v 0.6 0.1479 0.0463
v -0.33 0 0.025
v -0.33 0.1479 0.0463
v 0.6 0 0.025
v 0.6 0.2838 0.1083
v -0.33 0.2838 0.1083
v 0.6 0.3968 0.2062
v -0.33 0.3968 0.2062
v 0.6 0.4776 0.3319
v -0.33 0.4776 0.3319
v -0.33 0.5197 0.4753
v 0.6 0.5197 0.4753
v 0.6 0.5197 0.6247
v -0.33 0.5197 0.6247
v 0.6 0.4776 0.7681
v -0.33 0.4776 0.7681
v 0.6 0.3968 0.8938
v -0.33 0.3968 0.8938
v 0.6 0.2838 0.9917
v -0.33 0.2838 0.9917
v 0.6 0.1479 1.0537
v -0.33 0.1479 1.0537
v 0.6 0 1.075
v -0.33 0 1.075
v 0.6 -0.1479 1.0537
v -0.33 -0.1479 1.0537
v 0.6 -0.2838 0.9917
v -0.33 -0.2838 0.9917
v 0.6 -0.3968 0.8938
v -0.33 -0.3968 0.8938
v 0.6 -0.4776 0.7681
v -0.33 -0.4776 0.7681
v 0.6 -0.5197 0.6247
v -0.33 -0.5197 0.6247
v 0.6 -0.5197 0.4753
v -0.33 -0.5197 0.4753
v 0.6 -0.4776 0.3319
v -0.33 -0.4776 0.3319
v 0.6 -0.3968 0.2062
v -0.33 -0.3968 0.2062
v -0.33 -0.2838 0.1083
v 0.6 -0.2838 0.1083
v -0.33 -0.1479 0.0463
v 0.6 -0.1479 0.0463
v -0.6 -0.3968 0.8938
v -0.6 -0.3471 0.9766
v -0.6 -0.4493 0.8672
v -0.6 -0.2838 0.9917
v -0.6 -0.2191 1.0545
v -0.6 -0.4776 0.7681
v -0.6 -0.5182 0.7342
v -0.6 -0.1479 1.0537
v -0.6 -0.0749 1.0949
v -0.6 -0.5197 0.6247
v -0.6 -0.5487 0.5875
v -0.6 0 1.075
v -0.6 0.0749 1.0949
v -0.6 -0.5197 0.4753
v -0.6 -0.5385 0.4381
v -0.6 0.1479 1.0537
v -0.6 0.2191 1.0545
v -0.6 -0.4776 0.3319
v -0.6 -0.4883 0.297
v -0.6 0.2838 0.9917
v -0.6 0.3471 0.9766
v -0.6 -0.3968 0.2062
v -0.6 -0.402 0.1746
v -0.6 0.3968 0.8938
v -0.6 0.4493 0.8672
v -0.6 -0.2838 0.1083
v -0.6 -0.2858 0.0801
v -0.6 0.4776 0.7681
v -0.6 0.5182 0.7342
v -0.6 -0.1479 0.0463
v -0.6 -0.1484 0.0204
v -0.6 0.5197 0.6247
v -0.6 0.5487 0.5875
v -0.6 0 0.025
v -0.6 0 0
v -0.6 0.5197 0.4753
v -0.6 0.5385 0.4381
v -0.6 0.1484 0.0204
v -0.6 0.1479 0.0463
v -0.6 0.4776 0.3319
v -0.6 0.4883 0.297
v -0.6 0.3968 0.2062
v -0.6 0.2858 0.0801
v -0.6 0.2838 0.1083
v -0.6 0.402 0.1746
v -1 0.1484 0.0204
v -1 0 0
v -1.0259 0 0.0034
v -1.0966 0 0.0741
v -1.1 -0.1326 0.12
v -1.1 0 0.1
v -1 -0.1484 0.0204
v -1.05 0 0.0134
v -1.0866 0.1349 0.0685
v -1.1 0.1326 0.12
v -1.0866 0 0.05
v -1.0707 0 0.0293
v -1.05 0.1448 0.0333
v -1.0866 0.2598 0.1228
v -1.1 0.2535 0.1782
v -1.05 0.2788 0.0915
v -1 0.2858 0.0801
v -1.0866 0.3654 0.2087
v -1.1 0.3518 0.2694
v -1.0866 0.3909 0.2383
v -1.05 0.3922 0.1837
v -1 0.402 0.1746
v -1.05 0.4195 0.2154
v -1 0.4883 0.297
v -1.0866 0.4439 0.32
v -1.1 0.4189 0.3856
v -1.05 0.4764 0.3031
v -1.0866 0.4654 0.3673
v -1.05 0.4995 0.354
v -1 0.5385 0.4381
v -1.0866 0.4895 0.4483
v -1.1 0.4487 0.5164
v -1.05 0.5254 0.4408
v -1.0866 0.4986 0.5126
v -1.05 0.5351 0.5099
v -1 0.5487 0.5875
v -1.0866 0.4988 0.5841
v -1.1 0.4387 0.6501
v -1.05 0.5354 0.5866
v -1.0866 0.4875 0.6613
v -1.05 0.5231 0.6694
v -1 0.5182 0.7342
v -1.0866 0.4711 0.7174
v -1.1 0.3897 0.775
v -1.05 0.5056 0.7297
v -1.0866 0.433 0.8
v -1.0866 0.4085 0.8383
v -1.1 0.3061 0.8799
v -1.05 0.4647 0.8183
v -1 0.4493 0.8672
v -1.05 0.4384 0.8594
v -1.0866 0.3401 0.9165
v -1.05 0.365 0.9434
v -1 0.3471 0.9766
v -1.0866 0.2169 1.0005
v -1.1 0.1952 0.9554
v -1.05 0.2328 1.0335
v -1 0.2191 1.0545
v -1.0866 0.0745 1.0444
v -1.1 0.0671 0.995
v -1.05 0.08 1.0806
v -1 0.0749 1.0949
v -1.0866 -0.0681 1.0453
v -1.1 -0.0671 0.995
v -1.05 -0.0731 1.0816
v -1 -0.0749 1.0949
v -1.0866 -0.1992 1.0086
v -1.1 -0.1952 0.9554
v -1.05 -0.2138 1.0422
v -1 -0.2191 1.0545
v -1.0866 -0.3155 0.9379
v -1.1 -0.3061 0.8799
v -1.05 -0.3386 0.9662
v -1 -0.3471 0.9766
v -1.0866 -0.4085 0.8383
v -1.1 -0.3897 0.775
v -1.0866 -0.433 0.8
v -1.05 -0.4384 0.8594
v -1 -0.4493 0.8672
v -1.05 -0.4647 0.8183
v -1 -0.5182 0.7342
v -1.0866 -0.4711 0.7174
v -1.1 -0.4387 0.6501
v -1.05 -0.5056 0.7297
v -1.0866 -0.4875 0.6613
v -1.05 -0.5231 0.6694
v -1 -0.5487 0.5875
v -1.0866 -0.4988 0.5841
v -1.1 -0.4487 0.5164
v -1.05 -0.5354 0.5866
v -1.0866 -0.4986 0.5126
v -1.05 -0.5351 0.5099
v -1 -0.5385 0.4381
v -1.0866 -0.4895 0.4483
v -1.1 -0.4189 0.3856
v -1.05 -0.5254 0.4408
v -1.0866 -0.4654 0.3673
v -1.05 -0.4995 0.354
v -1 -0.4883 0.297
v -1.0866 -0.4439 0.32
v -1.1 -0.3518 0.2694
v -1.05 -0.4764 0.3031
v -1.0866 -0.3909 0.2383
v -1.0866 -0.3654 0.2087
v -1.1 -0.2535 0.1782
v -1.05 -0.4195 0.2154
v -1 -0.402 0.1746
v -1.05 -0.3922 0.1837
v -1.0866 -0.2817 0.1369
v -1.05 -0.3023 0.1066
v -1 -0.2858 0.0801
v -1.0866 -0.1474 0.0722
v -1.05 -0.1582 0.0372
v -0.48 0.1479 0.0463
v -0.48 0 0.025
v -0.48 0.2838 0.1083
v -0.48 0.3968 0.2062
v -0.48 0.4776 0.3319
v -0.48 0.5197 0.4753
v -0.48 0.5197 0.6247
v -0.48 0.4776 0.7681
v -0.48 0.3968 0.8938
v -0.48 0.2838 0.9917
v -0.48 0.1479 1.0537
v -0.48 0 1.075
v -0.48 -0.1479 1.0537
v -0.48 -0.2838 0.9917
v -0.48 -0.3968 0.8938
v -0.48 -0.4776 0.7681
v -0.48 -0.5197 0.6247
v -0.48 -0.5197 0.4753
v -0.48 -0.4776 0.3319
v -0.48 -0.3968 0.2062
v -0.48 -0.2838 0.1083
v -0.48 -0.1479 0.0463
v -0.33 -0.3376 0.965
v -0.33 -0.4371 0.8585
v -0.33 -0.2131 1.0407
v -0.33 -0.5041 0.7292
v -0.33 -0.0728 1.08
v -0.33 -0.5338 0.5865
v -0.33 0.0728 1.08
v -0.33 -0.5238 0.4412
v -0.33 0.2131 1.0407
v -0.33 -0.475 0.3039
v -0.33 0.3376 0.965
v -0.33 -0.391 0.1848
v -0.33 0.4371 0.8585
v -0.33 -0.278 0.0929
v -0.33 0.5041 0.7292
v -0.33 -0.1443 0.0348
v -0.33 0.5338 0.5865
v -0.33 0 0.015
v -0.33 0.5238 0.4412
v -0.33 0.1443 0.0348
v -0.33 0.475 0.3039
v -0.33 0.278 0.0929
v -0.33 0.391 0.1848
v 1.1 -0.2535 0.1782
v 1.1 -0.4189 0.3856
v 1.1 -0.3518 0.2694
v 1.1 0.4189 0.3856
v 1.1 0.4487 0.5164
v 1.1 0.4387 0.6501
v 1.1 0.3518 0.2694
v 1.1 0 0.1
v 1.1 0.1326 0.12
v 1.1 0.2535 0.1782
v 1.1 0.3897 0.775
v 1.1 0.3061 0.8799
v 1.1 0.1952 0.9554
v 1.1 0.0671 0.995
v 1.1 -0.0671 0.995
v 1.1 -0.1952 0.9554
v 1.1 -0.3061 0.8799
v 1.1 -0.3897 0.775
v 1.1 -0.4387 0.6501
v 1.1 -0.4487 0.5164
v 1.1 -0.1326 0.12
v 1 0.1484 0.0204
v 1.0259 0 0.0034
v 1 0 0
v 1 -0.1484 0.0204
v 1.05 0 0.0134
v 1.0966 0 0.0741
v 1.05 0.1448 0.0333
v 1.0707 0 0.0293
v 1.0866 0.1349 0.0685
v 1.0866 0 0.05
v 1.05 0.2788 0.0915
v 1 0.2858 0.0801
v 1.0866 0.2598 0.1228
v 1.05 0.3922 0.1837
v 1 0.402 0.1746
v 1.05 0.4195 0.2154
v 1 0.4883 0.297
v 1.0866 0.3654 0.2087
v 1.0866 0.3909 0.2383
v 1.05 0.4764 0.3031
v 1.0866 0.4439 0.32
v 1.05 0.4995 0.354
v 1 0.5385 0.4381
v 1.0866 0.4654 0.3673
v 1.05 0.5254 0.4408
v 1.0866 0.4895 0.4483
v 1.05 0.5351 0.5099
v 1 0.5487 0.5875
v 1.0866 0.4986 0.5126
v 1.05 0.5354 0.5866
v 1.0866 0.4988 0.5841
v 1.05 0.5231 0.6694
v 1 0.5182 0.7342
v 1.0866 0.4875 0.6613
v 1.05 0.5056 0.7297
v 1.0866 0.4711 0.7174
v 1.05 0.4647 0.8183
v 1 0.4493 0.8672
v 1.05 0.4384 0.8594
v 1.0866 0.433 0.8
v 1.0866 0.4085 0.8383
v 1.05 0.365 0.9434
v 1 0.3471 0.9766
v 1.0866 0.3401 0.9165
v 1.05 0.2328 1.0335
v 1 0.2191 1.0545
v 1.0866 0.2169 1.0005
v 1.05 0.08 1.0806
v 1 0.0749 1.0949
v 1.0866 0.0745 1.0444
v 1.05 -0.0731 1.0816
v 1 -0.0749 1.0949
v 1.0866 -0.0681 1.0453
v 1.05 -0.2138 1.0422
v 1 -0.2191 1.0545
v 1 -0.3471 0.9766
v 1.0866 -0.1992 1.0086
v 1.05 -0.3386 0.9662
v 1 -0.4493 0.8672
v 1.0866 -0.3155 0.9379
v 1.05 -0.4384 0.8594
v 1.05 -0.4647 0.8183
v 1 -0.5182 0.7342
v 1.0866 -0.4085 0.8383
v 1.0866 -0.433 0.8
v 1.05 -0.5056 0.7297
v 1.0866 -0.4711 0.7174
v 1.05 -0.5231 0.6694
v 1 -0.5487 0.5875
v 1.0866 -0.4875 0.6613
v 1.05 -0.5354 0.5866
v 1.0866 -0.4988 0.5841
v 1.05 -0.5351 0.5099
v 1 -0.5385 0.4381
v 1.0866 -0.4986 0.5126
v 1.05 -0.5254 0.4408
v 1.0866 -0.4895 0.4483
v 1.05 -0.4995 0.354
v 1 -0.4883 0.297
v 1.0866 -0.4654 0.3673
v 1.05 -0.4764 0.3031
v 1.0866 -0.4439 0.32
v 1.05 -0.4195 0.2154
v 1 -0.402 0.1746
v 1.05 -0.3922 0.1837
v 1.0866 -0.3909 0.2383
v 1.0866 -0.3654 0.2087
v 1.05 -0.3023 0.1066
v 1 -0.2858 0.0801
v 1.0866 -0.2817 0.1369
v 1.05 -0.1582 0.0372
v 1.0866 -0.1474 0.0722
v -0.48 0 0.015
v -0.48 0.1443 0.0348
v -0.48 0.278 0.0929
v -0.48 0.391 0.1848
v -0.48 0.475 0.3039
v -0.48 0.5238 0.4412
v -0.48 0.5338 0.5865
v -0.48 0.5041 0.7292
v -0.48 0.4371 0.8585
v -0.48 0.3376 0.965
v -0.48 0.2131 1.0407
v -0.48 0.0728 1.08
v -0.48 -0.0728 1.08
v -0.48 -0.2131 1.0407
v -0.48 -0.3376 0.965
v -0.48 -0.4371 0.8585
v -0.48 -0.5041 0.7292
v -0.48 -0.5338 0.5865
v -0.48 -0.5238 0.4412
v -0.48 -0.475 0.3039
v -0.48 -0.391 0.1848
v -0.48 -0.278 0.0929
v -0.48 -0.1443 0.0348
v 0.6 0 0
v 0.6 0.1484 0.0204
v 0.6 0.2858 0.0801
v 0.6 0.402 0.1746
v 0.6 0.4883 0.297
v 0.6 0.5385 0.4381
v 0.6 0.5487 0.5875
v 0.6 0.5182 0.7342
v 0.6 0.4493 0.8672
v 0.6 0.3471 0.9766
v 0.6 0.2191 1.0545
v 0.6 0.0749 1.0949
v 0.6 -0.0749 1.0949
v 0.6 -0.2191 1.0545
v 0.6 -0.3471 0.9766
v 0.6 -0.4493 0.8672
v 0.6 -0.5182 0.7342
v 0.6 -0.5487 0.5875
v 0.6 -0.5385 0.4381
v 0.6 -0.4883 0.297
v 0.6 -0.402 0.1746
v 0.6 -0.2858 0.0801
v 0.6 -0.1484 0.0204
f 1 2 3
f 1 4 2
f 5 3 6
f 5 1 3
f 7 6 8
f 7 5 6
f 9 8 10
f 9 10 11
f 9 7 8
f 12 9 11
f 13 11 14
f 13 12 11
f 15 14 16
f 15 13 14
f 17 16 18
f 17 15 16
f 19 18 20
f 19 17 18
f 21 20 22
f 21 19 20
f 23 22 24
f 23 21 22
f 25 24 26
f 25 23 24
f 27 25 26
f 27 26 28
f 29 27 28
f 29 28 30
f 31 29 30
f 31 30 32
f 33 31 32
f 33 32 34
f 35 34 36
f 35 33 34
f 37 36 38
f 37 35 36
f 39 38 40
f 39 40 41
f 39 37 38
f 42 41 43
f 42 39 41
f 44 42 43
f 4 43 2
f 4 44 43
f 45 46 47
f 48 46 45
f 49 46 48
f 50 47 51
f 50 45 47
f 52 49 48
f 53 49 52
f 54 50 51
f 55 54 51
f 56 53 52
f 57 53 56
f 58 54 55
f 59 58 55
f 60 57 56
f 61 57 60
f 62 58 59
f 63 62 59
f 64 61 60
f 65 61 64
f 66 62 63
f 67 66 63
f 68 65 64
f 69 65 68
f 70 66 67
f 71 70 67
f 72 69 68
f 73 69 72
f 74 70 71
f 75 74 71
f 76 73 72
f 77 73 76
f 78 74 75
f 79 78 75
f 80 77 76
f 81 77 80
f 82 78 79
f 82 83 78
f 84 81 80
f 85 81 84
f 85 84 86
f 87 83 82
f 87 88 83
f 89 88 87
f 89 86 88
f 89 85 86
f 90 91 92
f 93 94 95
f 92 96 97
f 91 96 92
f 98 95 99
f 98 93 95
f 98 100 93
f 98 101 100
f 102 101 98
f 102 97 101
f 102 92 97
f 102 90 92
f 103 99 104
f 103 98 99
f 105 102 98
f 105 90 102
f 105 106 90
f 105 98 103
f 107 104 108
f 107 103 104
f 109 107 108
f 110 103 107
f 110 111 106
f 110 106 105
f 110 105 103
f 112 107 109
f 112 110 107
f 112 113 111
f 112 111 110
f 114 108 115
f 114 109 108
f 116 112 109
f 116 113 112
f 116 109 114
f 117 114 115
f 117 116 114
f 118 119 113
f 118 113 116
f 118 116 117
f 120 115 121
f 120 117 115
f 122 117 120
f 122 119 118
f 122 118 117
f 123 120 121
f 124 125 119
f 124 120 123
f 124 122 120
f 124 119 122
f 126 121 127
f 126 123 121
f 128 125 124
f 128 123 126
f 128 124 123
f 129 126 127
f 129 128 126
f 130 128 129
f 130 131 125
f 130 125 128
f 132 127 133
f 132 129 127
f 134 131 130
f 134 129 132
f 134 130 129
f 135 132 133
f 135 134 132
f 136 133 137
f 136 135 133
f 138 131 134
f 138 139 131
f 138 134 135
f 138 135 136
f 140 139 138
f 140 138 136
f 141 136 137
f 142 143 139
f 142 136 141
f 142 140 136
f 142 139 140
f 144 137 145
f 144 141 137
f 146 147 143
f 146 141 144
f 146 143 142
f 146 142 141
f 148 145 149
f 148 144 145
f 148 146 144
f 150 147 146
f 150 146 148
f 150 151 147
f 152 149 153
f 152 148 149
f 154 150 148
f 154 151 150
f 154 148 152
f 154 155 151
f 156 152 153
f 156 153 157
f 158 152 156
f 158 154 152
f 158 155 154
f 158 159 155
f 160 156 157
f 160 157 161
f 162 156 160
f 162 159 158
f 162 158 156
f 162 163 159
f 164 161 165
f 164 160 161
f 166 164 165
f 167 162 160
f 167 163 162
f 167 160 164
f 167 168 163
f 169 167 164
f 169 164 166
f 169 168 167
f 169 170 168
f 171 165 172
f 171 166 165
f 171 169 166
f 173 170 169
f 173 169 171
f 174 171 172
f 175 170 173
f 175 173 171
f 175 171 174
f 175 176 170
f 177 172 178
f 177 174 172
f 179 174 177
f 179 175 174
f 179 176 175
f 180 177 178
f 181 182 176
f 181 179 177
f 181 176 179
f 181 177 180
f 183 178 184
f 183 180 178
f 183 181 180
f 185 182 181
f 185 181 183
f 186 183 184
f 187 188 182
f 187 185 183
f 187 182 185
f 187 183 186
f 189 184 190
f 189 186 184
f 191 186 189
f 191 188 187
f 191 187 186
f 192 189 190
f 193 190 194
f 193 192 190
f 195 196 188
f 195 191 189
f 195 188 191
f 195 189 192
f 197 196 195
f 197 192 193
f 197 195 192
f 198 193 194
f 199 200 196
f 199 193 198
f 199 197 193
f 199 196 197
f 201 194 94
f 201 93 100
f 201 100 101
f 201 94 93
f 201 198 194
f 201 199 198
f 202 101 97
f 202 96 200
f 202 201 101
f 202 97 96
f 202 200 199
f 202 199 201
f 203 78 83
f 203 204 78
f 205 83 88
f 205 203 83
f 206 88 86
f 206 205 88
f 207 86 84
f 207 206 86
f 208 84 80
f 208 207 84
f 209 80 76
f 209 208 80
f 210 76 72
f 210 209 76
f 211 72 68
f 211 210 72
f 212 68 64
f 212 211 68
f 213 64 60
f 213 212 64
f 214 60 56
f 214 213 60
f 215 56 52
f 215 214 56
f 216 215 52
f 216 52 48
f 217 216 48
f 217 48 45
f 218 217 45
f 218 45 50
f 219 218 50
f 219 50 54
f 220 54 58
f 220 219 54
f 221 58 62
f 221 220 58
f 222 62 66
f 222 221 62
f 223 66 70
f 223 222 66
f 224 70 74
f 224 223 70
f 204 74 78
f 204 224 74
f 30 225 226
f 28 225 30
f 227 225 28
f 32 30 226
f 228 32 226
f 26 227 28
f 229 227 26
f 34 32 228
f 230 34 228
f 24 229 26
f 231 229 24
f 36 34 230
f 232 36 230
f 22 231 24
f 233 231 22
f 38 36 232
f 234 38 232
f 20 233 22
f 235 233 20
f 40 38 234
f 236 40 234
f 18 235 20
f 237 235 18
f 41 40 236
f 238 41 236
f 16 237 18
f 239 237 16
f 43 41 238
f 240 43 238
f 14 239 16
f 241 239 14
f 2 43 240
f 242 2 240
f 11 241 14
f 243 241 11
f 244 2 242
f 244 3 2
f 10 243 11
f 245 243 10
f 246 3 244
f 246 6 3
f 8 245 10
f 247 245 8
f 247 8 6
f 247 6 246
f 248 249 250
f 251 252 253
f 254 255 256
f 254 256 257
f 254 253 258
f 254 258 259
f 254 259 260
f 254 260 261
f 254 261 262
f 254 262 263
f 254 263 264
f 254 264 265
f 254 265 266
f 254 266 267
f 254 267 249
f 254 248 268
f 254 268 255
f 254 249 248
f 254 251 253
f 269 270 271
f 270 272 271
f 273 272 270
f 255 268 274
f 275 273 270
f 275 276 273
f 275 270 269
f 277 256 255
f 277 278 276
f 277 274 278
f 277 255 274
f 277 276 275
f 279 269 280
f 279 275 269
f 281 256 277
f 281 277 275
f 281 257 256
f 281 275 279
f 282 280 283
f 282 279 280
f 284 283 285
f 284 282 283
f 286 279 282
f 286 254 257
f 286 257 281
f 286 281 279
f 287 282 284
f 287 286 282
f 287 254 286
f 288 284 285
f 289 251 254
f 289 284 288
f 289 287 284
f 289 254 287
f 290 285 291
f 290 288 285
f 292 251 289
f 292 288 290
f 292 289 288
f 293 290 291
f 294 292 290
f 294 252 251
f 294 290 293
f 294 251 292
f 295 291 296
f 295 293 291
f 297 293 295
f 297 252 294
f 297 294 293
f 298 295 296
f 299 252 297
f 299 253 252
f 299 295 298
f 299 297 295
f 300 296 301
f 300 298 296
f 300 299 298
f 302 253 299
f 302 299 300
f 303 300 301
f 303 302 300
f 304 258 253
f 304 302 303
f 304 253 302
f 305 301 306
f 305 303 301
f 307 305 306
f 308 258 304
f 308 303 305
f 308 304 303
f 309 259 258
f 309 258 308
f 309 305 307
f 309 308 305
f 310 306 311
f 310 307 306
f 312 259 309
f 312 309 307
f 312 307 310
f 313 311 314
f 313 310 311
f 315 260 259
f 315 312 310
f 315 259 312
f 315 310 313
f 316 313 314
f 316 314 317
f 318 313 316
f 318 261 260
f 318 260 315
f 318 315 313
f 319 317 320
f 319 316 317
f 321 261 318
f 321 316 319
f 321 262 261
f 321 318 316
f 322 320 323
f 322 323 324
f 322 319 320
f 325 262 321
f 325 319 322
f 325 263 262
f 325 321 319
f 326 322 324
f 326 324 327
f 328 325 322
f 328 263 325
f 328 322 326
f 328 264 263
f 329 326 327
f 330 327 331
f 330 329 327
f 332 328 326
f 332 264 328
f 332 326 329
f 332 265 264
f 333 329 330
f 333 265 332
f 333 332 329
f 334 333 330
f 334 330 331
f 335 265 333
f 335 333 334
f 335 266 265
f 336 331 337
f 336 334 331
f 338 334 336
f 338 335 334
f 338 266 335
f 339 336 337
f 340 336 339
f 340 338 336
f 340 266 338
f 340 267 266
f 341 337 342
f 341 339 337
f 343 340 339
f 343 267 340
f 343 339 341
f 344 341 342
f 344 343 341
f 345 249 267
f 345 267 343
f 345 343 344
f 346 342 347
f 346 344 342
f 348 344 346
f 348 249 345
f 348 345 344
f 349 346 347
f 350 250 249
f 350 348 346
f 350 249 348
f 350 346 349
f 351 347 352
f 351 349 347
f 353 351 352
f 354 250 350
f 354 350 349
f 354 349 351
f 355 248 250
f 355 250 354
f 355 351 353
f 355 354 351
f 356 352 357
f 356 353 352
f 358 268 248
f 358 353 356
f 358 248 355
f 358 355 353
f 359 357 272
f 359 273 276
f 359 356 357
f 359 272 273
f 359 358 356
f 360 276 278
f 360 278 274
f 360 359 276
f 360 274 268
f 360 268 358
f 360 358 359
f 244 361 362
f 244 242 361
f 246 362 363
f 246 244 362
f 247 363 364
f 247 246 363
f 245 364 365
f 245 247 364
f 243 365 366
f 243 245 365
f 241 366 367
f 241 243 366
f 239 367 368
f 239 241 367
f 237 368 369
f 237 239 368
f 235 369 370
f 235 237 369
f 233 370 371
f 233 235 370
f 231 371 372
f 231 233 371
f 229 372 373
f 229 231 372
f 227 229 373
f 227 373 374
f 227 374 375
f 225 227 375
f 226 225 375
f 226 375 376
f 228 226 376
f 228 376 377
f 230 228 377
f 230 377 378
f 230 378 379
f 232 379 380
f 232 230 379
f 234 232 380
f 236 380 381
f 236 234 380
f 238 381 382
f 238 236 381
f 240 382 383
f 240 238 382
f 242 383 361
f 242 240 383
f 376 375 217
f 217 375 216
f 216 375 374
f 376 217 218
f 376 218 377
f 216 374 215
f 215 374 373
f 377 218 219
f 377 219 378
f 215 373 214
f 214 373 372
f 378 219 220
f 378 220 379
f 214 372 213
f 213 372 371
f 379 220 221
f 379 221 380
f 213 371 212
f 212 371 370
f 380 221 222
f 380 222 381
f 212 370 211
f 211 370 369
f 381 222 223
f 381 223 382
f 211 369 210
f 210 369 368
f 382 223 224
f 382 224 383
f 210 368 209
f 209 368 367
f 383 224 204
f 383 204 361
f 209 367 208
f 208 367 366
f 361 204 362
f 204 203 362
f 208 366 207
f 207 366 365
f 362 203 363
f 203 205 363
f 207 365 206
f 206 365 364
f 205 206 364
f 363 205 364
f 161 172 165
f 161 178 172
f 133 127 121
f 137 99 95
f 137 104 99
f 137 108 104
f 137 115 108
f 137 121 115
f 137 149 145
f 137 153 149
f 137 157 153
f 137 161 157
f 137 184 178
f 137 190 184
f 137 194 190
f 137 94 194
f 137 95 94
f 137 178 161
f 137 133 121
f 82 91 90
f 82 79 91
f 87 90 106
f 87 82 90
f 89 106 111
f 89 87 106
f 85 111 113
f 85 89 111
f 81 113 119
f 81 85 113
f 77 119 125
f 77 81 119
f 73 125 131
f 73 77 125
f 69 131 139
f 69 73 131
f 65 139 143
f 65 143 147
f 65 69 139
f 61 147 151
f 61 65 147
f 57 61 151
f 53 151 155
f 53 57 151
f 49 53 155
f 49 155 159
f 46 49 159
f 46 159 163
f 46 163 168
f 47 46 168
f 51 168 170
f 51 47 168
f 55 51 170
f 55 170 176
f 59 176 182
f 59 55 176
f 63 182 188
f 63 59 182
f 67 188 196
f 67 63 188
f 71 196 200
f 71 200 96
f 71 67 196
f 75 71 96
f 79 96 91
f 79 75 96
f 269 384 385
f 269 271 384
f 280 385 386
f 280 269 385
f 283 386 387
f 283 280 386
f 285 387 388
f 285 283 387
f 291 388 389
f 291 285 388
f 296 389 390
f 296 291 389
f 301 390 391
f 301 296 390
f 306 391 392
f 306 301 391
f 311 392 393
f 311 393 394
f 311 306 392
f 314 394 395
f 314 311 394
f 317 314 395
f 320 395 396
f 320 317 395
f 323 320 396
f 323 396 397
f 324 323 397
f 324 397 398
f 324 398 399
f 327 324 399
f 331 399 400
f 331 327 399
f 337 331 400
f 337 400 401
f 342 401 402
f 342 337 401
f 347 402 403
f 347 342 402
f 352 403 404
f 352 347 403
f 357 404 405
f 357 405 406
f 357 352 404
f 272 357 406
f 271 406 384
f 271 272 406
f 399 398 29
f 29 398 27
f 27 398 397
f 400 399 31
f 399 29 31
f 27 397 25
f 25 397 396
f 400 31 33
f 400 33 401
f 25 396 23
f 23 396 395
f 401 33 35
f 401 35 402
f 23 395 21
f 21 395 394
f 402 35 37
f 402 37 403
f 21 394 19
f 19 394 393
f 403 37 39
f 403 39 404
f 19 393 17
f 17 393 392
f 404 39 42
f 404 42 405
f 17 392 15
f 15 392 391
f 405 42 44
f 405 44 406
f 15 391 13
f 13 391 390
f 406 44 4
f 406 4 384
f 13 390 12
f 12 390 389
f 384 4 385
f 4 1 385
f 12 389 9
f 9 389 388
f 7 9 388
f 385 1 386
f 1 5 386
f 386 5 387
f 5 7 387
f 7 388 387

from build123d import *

# Parameters (mm, degrees)
SKETCH_W    = 1.7
SKETCH_H    = 0.525
SKETCH002_W = 0.15
SKETCH002_H = 0.02


with BuildPart() as revolution001:
    # Sketch001 → Revolution001 (revolve)
    with BuildSketch(Plane.XZ):
        with BuildLine():
            Line((-1, 0), (-0.6, 0))
            Line((-0.6, 0), (-0.6, 0.13))
            Line((-0.6, 0.13), (0.6, 0.13))
            Line((0.6, 0), (0.6, 0.13))
            Line((0.6, 0), (1, 0))
            ThreePointArc((1, 0), (1.070711, 0.029289), (1.1, 0.1))
            Line((1.1, 0.1), (1.1, 0.55))
            Line((-1.1, 0.55), (1.1, 0.55))
            Line((-1.1, 0.55), (-1.1, 0.1))
            ThreePointArc((-1.1, 0.1), (-1.070711, 0.029289), (-1, 0))
        make_face()
    revolve(axis=Axis((-8.9, 0, 0.55), (1, 0, 0)))


with BuildPart() as revolution:
    # Sketch → Revolution (revolve)
    with BuildSketch(Plane.XZ):
        with Locations((0, 0.2875)):
            Rectangle(SKETCH_W, SKETCH_H)
    revolve(axis=Axis((-15.061842, 0, 0.55), (1, 0, 0)))


with BuildPart() as d_micromelf_standard:
    # Sketch002 → Revolution002 (revolve)
    with BuildSketch(Plane.XZ):
        with Locations((-0.405, 0.025)):
            Rectangle(SKETCH002_W, SKETCH002_H)
    revolve(axis=Axis((-15.061842, 0, 0.55), (1, 0, 0)))

    # Fusion: union Revolution001, Revolution
    add(revolution001.part)
    add(revolution.part)


solid = d_micromelf_standard.part
